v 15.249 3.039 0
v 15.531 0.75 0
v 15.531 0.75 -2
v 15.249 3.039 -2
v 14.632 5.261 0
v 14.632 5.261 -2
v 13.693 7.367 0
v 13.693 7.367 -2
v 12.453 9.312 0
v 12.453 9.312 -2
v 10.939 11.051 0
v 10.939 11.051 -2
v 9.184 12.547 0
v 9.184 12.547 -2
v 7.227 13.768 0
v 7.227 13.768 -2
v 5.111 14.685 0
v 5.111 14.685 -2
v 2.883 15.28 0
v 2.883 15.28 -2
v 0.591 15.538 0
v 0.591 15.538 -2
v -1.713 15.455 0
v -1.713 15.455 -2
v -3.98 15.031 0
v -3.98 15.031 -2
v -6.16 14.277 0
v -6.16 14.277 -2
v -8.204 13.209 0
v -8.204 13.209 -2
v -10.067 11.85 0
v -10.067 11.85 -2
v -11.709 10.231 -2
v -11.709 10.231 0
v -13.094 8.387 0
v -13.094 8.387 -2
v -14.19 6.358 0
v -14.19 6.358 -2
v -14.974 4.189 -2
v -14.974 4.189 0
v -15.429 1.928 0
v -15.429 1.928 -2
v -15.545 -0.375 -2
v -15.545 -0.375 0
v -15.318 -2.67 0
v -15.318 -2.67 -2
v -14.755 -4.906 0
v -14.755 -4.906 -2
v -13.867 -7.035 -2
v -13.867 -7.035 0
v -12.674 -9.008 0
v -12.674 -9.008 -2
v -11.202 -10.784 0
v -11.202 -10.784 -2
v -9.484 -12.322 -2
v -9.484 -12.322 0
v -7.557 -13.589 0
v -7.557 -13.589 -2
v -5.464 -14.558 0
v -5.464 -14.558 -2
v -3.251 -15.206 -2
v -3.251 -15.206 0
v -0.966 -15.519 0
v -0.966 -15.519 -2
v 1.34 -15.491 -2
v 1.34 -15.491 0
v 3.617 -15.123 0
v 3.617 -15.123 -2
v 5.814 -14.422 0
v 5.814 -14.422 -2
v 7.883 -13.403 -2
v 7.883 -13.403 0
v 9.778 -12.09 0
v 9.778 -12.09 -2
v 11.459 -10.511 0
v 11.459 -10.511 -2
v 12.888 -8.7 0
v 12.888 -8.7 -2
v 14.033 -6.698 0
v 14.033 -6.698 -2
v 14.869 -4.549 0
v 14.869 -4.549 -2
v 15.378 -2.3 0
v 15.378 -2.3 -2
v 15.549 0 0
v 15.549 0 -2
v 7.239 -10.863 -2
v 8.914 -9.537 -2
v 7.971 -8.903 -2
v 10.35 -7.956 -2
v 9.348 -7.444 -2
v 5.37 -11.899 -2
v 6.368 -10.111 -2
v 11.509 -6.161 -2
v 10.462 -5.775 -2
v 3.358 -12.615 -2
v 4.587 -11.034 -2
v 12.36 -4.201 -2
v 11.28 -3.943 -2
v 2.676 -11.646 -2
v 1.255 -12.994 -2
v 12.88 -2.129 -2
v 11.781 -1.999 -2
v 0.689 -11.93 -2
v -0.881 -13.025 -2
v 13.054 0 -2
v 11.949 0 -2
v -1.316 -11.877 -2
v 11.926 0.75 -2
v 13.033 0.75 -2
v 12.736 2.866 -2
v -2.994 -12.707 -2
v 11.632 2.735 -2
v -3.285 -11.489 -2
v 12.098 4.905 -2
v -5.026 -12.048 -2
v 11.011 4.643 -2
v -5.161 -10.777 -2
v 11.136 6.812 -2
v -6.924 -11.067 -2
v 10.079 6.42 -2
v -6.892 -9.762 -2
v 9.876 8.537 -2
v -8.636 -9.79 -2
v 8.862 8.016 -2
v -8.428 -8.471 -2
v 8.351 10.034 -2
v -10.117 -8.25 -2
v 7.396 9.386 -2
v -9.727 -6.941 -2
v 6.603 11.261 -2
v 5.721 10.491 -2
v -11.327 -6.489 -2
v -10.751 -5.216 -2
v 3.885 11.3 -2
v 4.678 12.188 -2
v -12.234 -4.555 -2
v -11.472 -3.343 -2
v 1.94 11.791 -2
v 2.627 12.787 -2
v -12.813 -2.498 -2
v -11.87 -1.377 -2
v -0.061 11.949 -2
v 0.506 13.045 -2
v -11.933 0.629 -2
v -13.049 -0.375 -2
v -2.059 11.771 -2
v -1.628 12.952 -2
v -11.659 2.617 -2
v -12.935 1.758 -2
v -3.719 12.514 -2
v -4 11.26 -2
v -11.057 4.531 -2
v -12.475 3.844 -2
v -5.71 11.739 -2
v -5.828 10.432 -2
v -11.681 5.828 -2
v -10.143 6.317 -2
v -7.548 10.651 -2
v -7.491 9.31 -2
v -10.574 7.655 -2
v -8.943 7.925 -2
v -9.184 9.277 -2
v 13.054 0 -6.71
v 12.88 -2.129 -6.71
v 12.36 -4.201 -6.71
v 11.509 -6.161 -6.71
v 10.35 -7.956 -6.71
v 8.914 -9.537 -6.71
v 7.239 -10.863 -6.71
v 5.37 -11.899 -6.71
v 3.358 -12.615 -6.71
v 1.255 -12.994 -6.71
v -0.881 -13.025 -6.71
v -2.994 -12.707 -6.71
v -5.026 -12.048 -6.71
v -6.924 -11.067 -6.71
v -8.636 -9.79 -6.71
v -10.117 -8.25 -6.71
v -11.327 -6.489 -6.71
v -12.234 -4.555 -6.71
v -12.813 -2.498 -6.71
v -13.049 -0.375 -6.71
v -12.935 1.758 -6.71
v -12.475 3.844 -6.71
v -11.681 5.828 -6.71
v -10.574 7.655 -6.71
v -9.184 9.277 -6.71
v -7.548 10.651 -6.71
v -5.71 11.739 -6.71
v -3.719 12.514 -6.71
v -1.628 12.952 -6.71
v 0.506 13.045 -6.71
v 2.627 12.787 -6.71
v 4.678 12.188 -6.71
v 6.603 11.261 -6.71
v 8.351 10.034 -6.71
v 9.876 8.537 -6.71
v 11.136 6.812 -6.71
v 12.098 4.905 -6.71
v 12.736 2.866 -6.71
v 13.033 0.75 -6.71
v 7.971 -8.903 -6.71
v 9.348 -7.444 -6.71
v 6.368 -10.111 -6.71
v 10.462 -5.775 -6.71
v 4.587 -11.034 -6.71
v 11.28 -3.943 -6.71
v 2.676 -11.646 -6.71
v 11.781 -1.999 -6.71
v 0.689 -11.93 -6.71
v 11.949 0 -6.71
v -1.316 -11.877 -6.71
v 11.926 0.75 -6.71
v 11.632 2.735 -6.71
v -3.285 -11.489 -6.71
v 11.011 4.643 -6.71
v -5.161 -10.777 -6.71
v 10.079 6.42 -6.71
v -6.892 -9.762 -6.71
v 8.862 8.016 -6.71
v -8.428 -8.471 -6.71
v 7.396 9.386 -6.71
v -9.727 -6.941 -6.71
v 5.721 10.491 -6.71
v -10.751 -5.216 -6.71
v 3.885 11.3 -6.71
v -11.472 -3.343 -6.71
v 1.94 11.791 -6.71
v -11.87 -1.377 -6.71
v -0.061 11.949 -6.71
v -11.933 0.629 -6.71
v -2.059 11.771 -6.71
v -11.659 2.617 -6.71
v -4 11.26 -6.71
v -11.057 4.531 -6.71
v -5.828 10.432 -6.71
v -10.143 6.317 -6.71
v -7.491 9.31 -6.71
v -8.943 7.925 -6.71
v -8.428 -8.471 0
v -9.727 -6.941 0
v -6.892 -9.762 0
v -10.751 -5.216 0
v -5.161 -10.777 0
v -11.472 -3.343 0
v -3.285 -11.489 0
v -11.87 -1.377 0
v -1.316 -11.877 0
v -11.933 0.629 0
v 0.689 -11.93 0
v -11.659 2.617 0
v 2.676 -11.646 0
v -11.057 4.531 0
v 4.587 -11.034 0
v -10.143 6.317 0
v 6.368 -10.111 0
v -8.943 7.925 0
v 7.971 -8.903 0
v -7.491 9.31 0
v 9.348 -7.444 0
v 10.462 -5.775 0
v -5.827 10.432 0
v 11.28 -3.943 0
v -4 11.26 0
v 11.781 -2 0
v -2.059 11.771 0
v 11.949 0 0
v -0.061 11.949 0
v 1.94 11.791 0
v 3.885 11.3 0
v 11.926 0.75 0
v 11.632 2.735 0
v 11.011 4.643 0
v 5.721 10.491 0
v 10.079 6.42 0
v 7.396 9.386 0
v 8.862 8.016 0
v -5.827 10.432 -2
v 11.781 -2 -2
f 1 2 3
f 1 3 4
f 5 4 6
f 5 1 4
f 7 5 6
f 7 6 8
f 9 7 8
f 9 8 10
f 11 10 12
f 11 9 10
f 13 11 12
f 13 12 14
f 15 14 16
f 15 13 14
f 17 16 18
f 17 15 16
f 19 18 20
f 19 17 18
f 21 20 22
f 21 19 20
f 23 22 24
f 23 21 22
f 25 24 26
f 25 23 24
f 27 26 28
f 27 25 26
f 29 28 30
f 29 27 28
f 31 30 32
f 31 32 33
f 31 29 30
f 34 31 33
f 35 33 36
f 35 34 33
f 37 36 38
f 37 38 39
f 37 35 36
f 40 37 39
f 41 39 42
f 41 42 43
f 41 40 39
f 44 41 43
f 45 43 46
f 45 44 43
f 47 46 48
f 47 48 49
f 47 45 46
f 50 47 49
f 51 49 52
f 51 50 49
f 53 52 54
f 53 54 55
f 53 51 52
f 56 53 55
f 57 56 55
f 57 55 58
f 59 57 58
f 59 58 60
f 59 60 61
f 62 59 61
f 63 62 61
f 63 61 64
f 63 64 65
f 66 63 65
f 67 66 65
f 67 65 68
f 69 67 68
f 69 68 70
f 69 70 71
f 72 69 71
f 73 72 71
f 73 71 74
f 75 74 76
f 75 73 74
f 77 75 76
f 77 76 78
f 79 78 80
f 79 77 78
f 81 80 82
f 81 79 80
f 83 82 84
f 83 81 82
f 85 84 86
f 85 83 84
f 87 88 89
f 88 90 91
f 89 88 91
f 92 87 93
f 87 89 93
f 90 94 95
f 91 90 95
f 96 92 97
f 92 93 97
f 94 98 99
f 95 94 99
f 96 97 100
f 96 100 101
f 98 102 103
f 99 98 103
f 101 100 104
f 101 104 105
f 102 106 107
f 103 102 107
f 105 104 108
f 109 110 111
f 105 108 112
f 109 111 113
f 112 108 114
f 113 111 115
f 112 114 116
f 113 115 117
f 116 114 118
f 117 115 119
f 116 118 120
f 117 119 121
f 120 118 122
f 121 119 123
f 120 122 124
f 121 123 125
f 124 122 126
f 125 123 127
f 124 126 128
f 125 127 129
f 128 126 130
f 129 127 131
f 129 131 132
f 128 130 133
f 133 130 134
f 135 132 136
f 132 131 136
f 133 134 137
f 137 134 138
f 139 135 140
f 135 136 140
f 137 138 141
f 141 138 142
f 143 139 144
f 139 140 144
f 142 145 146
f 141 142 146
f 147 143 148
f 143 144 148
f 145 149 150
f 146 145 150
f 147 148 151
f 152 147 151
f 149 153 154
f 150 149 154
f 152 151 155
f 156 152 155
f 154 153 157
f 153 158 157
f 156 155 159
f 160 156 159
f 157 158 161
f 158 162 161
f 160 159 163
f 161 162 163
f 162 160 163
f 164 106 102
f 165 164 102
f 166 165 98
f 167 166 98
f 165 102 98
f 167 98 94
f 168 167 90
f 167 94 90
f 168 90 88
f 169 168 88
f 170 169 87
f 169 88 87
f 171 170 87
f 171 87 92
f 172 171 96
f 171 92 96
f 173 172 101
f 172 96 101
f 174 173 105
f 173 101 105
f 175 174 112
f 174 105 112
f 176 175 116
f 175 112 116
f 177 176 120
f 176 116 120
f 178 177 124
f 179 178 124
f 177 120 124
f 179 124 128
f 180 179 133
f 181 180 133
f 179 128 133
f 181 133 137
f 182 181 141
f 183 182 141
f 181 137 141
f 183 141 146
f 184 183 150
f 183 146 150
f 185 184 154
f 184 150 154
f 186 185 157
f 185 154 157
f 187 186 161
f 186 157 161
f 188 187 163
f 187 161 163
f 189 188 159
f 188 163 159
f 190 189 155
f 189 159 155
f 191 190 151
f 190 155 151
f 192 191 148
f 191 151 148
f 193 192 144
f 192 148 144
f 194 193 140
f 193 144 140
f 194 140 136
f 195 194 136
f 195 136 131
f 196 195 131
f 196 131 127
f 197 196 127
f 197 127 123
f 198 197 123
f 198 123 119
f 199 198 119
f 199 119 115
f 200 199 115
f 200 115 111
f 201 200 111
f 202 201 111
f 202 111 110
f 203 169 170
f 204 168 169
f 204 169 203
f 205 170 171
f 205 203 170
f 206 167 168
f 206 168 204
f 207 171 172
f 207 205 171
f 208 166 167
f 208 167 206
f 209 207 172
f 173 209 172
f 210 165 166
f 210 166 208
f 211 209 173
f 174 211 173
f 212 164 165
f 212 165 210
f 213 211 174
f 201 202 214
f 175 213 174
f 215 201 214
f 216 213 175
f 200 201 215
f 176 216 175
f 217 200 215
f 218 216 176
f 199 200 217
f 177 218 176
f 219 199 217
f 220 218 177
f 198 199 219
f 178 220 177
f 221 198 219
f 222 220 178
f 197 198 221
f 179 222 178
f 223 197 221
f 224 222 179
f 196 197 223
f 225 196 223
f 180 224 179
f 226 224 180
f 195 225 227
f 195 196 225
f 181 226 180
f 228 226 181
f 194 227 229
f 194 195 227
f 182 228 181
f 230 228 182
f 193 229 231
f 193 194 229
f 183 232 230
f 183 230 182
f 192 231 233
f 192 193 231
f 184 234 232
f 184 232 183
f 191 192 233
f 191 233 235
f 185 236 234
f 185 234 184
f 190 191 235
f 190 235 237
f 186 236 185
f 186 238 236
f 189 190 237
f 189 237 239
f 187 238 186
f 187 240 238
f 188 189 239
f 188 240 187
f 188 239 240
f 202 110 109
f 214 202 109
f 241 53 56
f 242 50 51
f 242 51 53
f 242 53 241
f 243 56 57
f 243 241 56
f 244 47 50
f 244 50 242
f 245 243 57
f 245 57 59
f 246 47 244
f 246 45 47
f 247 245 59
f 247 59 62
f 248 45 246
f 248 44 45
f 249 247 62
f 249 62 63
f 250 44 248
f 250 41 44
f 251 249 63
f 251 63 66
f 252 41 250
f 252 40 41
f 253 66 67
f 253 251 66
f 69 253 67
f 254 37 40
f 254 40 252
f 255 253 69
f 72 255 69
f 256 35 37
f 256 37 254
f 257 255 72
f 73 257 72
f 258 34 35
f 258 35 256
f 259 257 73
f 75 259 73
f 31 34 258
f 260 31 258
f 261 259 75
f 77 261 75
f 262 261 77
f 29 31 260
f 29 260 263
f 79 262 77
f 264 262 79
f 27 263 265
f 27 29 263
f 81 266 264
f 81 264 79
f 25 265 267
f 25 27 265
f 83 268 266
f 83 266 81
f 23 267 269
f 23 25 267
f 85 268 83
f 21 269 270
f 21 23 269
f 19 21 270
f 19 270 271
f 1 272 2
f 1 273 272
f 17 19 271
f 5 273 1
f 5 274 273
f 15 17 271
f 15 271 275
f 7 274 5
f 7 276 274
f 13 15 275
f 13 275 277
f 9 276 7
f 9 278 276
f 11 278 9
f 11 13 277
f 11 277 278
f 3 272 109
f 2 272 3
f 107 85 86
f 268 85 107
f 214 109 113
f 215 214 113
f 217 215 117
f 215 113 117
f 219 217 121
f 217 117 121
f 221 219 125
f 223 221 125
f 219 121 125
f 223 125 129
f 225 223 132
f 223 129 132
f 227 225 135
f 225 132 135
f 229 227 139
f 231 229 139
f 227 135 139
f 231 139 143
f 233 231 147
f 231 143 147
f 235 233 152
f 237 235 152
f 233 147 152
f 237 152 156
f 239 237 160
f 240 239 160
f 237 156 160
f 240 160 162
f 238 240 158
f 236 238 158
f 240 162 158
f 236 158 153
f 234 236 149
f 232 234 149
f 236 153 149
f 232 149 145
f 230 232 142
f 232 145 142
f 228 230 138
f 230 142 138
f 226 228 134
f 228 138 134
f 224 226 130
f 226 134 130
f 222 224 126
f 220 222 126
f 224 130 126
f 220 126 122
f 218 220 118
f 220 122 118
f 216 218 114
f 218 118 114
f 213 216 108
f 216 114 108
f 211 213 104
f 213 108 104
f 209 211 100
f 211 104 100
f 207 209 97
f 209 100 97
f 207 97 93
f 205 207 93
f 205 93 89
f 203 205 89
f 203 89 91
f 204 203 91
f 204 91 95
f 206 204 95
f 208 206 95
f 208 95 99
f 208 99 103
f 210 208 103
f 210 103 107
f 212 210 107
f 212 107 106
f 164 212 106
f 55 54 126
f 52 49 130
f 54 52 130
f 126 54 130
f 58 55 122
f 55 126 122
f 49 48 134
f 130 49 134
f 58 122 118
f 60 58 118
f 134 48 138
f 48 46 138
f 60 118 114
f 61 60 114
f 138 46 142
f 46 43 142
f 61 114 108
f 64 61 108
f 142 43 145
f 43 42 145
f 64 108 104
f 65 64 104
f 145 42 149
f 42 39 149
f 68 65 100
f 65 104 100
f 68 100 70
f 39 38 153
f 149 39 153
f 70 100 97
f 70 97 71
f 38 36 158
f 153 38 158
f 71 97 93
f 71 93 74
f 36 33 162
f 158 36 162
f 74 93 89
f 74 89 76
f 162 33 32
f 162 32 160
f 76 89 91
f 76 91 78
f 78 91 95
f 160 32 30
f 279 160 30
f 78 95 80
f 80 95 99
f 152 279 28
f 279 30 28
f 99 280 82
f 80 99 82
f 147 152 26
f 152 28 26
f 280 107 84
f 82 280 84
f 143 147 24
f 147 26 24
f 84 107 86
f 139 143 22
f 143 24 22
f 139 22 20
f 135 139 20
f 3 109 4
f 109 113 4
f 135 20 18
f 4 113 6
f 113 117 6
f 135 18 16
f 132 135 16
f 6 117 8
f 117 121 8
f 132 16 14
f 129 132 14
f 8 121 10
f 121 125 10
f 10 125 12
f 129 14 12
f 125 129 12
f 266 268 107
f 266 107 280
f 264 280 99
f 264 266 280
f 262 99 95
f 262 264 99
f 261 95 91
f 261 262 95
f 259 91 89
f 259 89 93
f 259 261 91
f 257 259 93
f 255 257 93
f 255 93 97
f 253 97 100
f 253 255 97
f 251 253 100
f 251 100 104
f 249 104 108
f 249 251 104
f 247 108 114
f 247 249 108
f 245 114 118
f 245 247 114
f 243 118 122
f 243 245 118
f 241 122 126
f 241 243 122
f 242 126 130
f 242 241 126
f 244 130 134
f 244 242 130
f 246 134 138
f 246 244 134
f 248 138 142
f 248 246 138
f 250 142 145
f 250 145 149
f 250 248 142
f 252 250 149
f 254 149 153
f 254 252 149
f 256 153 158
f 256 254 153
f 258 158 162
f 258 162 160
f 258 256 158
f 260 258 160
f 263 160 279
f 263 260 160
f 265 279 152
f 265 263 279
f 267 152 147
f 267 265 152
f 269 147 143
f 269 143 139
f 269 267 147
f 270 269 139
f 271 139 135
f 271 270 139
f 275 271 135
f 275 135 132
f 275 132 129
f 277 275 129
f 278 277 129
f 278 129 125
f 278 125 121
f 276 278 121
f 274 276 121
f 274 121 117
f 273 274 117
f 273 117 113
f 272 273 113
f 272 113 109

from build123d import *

# Parameters (mm, degrees)
BOSS_EXTRUDE2_DEPTH = 2
BOSS_EXTRUDE3_DEPTH = 4.71


with BuildPart() as part:
    # Sketch1 → Boss-Extrude2 (new body)
    with BuildSketch(Plane.XY):
        with BuildLine():
            Line((11.925891602, 0.750005761), (15.531174529, 0.750066382))
            ThreePointArc((15.531174529, 0.750066382), (-15.544767078, -0.375158498), (15.549275935, 3.0615e-05))
            Line((15.549275935, 3.0615e-05), (11.94945183, -2.9915e-05))
            ThreePointArc((11.94945183, -2.9915e-05), (-11.943555264, -0.375172617), (11.925891602, 0.750005761))
        make_face()
    extrude(amount=-BOSS_EXTRUDE2_DEPTH)


with BuildPart() as body_2:
    # Sketch2 → Boss-Extrude3 (new body)
    with BuildSketch(Plane(origin=(0, 0, -2), x_dir=(-1, 0, 0), z_dir=(0, 0, -1))):
        with BuildLine():
            Line((-11.949441301, -1.8109e-05), (-13.054393914, 1.8645e-05))
            ThreePointArc((-13.054393914, 1.8645e-05), (13.049018878, -0.375186095), (-13.032829211, 0.750041992))
            Line((-13.032829211, 0.750041992), (-11.925881078, 0.750005172))
            ThreePointArc((-11.925881078, 0.750005172), (11.943565601, -0.375179241), (-11.949441301, -1.8109e-05))
        make_face()
    extrude(amount=BOSS_EXTRUDE3_DEPTH)


solid = Compound([part.part, body_2.part])
